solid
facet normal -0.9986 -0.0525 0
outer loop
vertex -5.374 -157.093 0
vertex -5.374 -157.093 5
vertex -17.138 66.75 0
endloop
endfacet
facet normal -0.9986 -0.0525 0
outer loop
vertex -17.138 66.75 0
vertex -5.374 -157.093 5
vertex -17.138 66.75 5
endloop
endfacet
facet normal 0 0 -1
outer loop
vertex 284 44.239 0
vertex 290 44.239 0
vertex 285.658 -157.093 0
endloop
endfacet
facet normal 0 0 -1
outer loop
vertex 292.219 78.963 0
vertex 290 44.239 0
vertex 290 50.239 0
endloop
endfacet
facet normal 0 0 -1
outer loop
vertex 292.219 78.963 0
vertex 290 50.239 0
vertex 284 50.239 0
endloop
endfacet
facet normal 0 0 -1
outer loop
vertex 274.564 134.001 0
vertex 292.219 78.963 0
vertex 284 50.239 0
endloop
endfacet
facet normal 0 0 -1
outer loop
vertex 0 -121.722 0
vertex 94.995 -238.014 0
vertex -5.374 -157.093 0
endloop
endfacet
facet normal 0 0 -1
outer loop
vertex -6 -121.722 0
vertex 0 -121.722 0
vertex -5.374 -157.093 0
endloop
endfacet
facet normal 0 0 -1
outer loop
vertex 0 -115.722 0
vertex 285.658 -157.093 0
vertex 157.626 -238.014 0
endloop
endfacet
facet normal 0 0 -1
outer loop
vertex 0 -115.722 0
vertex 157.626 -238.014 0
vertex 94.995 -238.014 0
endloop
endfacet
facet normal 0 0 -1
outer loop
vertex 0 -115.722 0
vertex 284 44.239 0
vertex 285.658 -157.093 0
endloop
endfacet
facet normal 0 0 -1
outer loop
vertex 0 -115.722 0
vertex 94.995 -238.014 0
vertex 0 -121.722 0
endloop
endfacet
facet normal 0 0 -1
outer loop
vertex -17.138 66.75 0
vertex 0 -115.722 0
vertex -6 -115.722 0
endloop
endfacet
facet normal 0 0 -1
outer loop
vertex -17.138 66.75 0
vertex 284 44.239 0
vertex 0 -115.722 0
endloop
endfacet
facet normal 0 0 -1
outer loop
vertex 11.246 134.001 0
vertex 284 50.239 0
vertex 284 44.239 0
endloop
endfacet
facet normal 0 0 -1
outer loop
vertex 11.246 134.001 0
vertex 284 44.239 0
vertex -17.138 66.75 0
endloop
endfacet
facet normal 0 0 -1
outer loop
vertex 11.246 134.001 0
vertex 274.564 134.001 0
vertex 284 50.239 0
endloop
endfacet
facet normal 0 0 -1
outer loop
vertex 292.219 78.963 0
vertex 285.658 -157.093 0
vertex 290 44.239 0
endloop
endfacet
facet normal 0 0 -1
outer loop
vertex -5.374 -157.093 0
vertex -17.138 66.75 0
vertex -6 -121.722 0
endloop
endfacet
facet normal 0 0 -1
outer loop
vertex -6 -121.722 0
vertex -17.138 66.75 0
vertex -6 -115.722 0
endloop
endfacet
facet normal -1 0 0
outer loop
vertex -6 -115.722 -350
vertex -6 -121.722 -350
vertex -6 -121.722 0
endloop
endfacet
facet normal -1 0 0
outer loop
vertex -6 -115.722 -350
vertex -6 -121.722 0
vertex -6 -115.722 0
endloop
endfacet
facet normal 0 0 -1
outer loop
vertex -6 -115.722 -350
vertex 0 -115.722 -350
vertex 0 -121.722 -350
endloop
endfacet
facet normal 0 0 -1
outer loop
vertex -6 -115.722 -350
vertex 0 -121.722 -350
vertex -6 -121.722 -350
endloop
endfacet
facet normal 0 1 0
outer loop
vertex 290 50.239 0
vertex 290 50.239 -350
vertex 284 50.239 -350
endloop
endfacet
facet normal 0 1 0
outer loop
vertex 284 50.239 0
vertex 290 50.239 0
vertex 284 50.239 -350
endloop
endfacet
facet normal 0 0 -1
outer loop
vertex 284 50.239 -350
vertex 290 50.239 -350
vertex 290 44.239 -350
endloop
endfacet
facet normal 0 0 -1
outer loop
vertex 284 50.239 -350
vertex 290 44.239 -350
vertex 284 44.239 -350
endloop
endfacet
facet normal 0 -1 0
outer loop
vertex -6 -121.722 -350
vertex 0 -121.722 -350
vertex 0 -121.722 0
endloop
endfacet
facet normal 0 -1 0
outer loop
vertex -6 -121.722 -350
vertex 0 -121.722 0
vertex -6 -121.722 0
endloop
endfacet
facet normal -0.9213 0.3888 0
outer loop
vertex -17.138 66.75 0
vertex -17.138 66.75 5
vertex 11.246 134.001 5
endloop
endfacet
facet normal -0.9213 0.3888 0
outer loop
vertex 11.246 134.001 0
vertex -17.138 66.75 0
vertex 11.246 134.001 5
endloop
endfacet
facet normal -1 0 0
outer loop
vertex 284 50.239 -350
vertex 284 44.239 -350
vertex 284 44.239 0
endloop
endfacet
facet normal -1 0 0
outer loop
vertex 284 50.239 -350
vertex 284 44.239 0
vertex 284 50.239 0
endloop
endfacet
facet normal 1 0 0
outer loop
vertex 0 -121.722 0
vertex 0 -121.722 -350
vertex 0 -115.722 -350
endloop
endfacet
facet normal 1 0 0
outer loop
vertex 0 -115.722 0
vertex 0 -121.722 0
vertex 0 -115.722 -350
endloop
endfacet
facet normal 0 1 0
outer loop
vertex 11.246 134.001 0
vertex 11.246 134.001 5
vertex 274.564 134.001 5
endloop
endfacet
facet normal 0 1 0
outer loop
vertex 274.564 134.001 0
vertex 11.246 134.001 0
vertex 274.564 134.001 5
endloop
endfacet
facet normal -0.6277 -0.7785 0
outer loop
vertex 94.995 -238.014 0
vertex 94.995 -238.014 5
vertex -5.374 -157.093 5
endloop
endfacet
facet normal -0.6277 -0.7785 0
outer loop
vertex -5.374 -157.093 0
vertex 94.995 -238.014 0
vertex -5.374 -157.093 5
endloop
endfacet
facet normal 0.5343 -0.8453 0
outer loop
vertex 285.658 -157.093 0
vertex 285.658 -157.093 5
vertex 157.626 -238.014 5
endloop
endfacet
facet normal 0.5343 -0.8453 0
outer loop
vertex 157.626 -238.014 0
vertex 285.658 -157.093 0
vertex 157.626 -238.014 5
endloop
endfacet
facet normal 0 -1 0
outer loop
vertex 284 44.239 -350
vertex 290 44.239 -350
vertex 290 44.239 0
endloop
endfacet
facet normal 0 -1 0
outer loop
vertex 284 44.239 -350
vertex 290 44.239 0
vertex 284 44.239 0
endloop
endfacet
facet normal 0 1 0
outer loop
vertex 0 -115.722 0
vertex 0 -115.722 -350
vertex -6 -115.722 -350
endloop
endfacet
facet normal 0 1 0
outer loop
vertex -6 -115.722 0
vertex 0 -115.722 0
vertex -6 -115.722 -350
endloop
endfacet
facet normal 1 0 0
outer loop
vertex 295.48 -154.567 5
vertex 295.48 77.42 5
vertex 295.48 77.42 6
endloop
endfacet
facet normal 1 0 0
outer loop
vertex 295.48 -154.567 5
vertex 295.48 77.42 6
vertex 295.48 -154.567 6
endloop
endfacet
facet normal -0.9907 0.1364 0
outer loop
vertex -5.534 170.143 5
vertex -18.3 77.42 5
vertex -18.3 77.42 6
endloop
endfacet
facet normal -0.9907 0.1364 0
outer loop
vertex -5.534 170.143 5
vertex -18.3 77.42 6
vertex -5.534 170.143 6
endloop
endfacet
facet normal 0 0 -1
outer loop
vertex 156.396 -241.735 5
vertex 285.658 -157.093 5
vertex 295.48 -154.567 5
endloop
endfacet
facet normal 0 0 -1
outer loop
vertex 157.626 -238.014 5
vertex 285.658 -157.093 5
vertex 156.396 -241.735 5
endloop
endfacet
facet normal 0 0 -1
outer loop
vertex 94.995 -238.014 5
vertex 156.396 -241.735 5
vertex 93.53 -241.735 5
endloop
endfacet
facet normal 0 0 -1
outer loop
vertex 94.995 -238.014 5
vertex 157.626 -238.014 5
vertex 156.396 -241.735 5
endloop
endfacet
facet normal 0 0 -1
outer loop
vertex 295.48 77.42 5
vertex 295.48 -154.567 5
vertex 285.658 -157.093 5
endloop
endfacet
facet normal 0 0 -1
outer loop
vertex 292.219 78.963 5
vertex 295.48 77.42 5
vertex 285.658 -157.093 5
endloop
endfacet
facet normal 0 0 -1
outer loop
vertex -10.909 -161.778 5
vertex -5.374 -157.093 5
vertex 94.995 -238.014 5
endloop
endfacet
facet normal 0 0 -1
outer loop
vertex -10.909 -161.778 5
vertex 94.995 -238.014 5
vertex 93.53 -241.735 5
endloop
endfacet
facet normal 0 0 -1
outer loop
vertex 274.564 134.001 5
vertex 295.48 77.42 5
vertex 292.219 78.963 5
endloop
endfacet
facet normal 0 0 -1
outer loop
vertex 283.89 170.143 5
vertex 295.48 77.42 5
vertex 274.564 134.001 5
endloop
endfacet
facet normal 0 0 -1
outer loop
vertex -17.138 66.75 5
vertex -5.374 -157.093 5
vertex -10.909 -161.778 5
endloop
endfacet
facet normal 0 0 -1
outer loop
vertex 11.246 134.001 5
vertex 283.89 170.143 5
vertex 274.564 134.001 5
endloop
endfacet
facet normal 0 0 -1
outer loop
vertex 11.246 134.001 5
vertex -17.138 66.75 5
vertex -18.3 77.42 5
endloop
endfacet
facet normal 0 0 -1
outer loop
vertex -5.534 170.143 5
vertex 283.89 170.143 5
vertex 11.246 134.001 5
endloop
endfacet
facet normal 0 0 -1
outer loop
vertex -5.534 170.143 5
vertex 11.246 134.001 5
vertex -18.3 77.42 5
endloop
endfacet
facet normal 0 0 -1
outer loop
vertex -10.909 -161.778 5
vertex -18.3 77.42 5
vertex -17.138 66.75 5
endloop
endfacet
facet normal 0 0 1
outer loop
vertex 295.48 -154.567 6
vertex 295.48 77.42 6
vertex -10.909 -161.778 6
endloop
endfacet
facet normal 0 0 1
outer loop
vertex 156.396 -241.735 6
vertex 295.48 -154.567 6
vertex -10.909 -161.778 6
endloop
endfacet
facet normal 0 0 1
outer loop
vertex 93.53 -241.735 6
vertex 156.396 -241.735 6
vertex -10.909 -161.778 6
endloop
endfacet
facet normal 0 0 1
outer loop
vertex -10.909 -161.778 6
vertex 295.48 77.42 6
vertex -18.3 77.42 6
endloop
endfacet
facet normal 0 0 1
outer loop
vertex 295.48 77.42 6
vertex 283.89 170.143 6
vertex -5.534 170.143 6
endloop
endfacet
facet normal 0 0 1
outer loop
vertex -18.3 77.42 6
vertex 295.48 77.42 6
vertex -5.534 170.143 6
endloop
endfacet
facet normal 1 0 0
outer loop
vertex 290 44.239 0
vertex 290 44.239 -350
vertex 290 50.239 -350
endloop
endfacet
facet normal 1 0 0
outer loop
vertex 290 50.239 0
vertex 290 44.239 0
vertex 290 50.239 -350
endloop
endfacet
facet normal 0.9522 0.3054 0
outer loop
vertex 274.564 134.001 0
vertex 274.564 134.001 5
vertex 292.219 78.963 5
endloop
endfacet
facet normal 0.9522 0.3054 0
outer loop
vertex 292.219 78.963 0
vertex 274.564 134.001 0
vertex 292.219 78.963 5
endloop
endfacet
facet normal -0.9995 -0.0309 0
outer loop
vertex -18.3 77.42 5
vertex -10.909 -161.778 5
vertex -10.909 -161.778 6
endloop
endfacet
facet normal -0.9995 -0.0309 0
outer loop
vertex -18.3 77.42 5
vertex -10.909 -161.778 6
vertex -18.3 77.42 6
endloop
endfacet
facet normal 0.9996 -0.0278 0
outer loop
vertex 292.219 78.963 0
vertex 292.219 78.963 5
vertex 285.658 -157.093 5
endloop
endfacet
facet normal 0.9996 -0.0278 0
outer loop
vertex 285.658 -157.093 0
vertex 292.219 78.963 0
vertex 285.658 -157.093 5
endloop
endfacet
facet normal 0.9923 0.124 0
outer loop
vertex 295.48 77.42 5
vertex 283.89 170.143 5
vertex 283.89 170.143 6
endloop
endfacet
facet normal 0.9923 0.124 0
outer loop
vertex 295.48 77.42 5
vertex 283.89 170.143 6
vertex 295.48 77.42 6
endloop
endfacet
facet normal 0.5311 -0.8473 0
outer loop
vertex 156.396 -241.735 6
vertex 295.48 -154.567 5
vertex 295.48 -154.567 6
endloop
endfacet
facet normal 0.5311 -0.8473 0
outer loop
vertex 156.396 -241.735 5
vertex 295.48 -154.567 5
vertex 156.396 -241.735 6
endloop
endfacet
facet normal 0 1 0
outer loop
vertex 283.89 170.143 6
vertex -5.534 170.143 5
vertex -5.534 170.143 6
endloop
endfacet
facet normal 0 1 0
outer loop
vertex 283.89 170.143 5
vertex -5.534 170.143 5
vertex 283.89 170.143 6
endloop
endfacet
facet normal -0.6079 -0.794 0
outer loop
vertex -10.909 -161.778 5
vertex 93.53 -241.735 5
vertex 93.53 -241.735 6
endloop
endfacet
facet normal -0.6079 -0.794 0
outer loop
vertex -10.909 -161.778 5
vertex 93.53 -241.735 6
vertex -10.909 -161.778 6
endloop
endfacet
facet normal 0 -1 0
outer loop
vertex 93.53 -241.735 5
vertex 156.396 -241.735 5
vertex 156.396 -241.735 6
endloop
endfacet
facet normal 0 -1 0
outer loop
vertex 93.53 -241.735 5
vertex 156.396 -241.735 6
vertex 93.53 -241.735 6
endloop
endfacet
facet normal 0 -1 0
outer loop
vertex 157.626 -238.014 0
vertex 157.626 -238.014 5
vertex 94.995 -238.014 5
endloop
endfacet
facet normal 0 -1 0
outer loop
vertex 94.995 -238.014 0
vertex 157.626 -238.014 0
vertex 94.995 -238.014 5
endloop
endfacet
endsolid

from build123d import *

# Parameters (mm, degrees)
ESQUISSE1_W        = 50
ESQUISSE1_H        = 50
BOSS_EXTRU_1_DEPTH = 5
BOSS_EXTRU_2_DEPTH = 5
ESQUISSE3_W        = 6
ESQUISSE3_H        = 6
BOSS_EXTRU_3_DEPTH = 350
BOSS_EXTRU_4_DEPTH = 1


with BuildPart() as part:
    # Esquisse1 → Boss.-Extru.1 (new body)
    with BuildSketch(Plane.XY):
        with Locations((25, 25)):
            Rectangle(ESQUISSE1_W, ESQUISSE1_H)
    extrude(amount=BOSS_EXTRU_1_DEPTH)

    # Esquisse2 → Boss.-Extru.2 (add)
    with BuildSketch(Plane.XY.offset(5)):
        Polygon((-17.13807747, 66.750016637), (11.246380261, 134.000915956), (274.564409595, 134.000915956), (292.219085418, 78.963245992), (285.658191139, -157.093376415), (157.625700404, -238.014344585), (94.995088054, -238.014344585), (-5.374322013, -157.093376415), align=None)
    extrude(amount=-BOSS_EXTRU_2_DEPTH)

    # Esquisse3 → Boss.-Extru.3 (add)
    with BuildSketch(Plane(origin=(0, 0, 0), x_dir=(-1, 0, 0), z_dir=(0, 0, -1))):
        with Locations((3, -118.721693301)):
            Rectangle(ESQUISSE3_W, ESQUISSE3_H)
        with Locations((-287, 47.238939464)):
            Rectangle(ESQUISSE3_W, ESQUISSE3_H)
    extrude(amount=BOSS_EXTRU_3_DEPTH)

    # Esquisse4 → Boss.-Extru.4 (add)
    with BuildSketch(Plane.XY.offset(5)):
        Polygon((-5.533858716, 170.143499993), (283.889977684, 170.143499993), (295.480369275, 77.420367263), (295.480369275, -154.566750541), (156.395670181, -241.735343219), (93.529944497, -241.735343219), (-10.909112788, -161.778438909), (-18.300087136, 77.420367263), align=None)
    extrude(amount=BOSS_EXTRU_4_DEPTH)


solid = part.part
